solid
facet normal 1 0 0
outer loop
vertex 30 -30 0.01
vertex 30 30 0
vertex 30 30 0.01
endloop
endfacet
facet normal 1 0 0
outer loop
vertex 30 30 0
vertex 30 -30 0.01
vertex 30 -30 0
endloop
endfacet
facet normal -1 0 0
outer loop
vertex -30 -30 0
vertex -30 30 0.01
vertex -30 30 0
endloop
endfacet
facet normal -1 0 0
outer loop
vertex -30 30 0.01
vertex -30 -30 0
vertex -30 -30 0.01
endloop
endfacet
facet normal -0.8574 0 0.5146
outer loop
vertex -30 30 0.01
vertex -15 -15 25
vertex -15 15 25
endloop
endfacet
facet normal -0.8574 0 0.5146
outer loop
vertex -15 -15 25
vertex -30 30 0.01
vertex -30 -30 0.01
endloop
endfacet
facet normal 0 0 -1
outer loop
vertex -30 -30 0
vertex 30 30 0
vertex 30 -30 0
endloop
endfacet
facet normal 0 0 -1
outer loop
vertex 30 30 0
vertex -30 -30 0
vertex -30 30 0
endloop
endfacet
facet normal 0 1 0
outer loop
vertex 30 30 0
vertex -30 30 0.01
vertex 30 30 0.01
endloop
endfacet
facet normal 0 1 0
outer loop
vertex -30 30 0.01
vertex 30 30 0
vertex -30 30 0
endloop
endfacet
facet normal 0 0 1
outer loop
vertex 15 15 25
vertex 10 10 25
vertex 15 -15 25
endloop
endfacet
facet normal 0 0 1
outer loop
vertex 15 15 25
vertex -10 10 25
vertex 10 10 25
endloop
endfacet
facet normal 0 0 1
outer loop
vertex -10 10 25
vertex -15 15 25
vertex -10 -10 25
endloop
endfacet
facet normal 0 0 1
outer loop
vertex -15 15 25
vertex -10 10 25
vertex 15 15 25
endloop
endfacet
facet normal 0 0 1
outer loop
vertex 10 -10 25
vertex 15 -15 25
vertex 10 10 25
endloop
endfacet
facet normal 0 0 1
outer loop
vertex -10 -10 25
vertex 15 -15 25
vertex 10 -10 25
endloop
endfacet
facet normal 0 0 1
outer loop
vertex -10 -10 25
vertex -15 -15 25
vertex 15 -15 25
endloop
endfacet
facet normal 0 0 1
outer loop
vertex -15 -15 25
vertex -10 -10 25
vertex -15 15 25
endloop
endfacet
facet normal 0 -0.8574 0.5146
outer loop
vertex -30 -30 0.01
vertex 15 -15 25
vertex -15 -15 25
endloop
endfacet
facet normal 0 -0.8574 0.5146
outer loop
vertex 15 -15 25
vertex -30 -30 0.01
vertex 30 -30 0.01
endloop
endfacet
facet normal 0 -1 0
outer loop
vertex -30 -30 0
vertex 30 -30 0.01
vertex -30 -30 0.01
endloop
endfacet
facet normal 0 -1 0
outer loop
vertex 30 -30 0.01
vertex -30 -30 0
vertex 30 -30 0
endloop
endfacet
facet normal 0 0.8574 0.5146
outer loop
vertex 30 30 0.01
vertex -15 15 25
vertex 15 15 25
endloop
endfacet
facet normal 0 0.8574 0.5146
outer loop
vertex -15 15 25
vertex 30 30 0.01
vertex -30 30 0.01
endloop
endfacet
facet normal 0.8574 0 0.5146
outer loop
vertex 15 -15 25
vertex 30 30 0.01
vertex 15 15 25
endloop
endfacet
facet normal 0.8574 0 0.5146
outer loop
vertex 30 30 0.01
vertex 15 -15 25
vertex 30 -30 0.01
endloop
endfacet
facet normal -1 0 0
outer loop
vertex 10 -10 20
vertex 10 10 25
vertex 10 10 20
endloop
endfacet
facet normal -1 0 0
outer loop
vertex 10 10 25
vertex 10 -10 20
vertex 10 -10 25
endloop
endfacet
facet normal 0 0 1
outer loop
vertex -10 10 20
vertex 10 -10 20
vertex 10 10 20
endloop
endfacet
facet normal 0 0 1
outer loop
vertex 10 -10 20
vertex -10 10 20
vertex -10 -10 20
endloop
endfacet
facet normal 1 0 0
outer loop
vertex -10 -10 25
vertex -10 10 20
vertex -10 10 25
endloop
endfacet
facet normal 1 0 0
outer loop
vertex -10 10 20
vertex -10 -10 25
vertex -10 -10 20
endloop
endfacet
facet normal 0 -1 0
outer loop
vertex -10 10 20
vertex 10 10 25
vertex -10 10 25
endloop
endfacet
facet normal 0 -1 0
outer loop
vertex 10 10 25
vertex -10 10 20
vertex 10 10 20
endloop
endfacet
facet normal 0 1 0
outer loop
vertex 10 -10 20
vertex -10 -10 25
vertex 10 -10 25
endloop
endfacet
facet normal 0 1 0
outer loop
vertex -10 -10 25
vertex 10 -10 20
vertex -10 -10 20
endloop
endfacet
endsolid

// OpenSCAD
// Tapered riser block (square frustum) with top pocket
// Print orientation: large base on bed, builds upward (+Z)

$fn = 64;

// --- Dimensions (mm) ---
base_size    = 60;   // bottom square side at z = 0
top_size     = 30;   // top square side at z = height
height       = 25;   // overall height
pocket_size  = 20;   // square pocket side (in top face)
pocket_depth = 5;    // pocket depth from top face
eps          = 0.5;  // cutter overshoot past faces

// Solid square frustum, edges parallel to X and Y
module frustum() {
    hull() {
        translate([-base_size/2, -base_size/2, 0])
            cube([base_size, base_size, 0.01]);
        translate([-top_size/2, -top_size/2, height - 0.01])
            cube([top_size, top_size, 0.01]);
    }
}

difference() {
    frustum();
    // Centred square pocket cut down from the top face
    translate([-pocket_size/2, -pocket_size/2, height - pocket_depth])
        cube([pocket_size, pocket_size, pocket_depth + eps]);
}
